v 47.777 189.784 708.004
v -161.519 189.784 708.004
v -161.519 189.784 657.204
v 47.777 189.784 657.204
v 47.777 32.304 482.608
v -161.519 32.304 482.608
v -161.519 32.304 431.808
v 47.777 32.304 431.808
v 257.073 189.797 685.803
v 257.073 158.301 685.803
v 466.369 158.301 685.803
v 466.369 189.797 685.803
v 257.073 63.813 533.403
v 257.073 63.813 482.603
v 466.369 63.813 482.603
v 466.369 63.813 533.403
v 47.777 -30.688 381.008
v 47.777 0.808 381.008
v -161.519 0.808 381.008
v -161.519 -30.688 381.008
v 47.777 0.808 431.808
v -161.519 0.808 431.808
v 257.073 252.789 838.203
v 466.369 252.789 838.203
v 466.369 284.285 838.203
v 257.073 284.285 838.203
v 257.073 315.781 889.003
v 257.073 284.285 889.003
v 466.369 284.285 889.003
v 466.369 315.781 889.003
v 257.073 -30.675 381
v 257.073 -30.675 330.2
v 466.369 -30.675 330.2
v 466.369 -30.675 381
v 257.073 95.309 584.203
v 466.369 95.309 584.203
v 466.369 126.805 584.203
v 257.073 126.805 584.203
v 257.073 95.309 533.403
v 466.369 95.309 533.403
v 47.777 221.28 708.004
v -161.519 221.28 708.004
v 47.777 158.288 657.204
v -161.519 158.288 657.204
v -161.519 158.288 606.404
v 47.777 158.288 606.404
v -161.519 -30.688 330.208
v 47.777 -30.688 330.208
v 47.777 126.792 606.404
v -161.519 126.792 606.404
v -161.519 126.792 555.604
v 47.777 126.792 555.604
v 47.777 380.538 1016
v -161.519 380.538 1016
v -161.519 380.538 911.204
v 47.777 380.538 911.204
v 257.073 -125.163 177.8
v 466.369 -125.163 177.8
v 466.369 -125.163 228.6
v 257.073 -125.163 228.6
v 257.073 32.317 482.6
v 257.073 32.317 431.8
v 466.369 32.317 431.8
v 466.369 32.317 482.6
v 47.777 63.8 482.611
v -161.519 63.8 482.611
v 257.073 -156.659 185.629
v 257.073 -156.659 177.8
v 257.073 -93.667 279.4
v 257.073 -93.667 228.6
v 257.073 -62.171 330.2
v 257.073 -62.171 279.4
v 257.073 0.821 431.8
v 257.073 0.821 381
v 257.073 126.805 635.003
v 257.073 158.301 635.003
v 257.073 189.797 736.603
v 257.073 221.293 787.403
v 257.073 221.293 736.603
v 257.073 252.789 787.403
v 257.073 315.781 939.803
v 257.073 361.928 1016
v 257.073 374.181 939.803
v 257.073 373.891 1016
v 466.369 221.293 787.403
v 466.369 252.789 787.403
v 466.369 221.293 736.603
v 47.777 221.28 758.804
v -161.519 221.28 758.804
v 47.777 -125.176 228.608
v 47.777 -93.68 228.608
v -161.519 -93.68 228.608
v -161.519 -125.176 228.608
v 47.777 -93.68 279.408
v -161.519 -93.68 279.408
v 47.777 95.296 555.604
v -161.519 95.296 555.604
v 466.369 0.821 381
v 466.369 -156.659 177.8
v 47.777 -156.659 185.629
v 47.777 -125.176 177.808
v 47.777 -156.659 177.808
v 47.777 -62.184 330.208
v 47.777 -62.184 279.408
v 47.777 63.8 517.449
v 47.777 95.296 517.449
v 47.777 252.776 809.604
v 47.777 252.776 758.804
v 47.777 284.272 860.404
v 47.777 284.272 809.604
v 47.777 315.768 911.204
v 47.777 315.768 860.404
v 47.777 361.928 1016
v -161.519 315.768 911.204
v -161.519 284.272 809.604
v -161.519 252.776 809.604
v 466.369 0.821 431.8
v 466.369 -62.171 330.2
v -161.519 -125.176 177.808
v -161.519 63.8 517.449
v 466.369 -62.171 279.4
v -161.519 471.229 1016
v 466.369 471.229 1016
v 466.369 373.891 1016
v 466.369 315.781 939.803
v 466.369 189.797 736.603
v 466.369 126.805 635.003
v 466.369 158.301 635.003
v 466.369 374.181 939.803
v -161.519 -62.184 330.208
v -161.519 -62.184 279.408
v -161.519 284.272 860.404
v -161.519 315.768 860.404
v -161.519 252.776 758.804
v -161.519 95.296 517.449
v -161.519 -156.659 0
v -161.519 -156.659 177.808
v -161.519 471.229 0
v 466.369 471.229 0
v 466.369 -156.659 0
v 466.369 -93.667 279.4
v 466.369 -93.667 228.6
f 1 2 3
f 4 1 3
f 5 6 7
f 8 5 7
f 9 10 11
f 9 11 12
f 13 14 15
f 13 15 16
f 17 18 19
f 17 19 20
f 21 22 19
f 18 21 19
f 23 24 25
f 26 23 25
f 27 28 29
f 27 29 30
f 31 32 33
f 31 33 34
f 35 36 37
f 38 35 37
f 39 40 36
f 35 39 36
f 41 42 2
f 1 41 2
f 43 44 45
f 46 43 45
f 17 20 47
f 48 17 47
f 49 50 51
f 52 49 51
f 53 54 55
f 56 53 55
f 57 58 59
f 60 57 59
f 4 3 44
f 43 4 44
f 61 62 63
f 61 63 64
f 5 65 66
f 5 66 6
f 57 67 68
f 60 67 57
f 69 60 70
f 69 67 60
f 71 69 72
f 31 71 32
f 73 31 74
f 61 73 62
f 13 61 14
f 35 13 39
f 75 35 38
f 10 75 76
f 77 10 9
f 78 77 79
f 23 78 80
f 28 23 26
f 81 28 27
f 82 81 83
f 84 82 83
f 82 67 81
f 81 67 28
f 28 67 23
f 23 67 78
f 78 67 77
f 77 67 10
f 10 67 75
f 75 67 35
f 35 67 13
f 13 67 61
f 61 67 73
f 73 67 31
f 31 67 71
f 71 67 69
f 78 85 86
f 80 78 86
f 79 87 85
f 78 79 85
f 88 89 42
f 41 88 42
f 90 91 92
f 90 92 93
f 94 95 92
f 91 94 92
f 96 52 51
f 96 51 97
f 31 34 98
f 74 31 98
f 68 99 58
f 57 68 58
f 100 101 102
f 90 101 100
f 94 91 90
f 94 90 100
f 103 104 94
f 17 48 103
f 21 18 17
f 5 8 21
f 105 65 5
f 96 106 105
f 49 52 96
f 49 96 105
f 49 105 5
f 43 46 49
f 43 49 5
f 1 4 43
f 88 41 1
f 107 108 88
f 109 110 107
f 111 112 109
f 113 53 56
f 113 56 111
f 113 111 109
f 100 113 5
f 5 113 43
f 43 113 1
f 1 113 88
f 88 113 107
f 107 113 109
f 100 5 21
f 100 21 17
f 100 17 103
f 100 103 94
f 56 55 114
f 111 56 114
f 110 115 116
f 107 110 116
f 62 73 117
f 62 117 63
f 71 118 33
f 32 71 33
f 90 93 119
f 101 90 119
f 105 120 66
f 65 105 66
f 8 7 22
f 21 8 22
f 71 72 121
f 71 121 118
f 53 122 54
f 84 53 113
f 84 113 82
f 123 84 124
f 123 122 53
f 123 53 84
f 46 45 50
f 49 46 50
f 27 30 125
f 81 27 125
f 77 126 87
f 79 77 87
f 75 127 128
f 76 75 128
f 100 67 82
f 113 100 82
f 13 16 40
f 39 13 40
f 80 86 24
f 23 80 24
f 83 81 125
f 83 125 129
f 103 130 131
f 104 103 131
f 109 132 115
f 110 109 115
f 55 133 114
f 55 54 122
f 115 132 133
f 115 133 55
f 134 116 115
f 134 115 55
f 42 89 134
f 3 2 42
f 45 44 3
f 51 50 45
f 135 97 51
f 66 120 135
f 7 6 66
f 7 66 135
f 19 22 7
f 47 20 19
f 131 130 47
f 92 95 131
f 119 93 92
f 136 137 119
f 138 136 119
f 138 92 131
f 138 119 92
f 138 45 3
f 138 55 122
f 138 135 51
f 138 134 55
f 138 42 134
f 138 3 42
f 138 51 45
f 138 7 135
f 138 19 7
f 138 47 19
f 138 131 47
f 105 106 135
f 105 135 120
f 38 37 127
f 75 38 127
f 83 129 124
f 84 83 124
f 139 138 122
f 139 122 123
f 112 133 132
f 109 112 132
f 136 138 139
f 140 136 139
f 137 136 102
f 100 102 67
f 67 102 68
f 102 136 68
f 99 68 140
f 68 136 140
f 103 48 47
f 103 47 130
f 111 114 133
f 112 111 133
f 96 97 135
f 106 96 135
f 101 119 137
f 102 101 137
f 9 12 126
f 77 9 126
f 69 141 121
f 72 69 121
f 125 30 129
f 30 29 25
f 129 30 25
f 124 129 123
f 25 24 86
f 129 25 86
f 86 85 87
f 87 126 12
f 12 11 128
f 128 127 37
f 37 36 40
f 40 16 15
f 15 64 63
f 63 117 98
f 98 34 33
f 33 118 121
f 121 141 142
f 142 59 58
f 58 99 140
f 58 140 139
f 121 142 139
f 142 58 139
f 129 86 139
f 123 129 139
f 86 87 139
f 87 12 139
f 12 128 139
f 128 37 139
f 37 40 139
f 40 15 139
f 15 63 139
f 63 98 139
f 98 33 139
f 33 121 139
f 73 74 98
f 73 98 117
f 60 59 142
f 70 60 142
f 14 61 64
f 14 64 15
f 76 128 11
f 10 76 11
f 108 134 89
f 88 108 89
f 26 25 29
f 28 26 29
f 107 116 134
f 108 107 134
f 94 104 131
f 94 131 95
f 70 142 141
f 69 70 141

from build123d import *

# Parameters (mm, degrees)
F0_W     = 627.888
F0_H     = 627.888
F1_DEPTH = 1016
F3_DEPTH = 209.296
F5_DEPTH = 209.296
F7_DEPTH = 209.296


with BuildPart() as f1:
    # F0 (on Top) → F1 (new body)
    with BuildSketch(Plane.XY):
        with Locations((152.424791, 157.284912)):
            Rectangle(F0_W, F0_H)
    extrude(amount=F1_DEPTH)

    # F2 (on face) → F3 (cut)
    with BuildSketch(Plane.YZ.offset(466.368791)):
        Polygon((-156.659088, 1016), (-156.659088, 177.8), (-125.163088, 177.8), (-125.163088, 228.6), (-93.667088, 228.6), (-93.667088, 279.4), (-62.171088, 279.4), (-62.171088, 330.2), (-30.675088, 330.2), (-30.675088, 381), (0.820912, 381), (0.820912, 431.8), (32.316912, 431.8), (32.316912, 482.6), (63.812912, 482.602637), (63.812912, 533.402637), (95.308912, 533.402637), (95.308912, 584.202637), (126.804912, 584.202637), (126.804912, 635.002637), (158.300912, 635.002637), (158.300912, 685.802637), (189.796912, 685.802637), (189.796912, 736.602637), (221.292912, 736.602637), (221.292912, 787.402637), (252.788912, 787.402637), (252.788912, 838.202637), (284.284912, 838.202637), (284.284912, 889.002637), (315.780912, 889.002637), (315.780912, 939.802637), (374.181002, 939.802637), (373.890931, 1016), align=None)
    extrude(amount=-F3_DEPTH, mode=Mode.SUBTRACT)

    # F4 (on face) → F5 (cut)
    with BuildSketch(Plane.YZ.offset(257.072791)):
        Polygon((-156.659088, 185.628965), (361.928195, 1016), (-156.659088, 1016), align=None)
    extrude(amount=-F5_DEPTH, mode=Mode.SUBTRACT)

    # F6 (on face) → F7 (cut)
    with BuildSketch(Plane(origin=(-161.519209, 0, 0), x_dir=(0, -1, 0), z_dir=(-1, 0, 0))):
        Polygon((156.659088, 1016), (-380.538228, 1016), (-380.538228, 911.203689), (-315.768228, 911.203689), (-315.768228, 860.403689), (-284.272228, 860.403689), (-284.272228, 809.603689), (-252.776228, 809.603689), (-252.776228, 758.803689), (-221.280228, 758.803689), (-221.280228, 708.003689), (-189.784228, 708.003689), (-189.784228, 657.203689), (-158.288228, 657.203689), (-158.288228, 606.403689), (-126.792228, 606.403689), (-126.792228, 555.603689), (-95.296228, 555.603689), (-95.296228, 517.449326), (-63.800228, 517.449326), (-63.800228, 482.611007), (-32.304228, 482.60837), (-32.304228, 431.80837), (-0.808228, 431.80837), (-0.808228, 381.00837), (30.687772, 381.00837), (30.687772, 330.20837), (62.183772, 330.20837), (62.183772, 279.40837), (93.679772, 279.40837), (93.679772, 228.60837), (125.175772, 228.60837), (125.175772, 177.80837), (156.659088, 177.80837), align=None)
    extrude(amount=-F7_DEPTH, mode=Mode.SUBTRACT)


solid = f1.part
